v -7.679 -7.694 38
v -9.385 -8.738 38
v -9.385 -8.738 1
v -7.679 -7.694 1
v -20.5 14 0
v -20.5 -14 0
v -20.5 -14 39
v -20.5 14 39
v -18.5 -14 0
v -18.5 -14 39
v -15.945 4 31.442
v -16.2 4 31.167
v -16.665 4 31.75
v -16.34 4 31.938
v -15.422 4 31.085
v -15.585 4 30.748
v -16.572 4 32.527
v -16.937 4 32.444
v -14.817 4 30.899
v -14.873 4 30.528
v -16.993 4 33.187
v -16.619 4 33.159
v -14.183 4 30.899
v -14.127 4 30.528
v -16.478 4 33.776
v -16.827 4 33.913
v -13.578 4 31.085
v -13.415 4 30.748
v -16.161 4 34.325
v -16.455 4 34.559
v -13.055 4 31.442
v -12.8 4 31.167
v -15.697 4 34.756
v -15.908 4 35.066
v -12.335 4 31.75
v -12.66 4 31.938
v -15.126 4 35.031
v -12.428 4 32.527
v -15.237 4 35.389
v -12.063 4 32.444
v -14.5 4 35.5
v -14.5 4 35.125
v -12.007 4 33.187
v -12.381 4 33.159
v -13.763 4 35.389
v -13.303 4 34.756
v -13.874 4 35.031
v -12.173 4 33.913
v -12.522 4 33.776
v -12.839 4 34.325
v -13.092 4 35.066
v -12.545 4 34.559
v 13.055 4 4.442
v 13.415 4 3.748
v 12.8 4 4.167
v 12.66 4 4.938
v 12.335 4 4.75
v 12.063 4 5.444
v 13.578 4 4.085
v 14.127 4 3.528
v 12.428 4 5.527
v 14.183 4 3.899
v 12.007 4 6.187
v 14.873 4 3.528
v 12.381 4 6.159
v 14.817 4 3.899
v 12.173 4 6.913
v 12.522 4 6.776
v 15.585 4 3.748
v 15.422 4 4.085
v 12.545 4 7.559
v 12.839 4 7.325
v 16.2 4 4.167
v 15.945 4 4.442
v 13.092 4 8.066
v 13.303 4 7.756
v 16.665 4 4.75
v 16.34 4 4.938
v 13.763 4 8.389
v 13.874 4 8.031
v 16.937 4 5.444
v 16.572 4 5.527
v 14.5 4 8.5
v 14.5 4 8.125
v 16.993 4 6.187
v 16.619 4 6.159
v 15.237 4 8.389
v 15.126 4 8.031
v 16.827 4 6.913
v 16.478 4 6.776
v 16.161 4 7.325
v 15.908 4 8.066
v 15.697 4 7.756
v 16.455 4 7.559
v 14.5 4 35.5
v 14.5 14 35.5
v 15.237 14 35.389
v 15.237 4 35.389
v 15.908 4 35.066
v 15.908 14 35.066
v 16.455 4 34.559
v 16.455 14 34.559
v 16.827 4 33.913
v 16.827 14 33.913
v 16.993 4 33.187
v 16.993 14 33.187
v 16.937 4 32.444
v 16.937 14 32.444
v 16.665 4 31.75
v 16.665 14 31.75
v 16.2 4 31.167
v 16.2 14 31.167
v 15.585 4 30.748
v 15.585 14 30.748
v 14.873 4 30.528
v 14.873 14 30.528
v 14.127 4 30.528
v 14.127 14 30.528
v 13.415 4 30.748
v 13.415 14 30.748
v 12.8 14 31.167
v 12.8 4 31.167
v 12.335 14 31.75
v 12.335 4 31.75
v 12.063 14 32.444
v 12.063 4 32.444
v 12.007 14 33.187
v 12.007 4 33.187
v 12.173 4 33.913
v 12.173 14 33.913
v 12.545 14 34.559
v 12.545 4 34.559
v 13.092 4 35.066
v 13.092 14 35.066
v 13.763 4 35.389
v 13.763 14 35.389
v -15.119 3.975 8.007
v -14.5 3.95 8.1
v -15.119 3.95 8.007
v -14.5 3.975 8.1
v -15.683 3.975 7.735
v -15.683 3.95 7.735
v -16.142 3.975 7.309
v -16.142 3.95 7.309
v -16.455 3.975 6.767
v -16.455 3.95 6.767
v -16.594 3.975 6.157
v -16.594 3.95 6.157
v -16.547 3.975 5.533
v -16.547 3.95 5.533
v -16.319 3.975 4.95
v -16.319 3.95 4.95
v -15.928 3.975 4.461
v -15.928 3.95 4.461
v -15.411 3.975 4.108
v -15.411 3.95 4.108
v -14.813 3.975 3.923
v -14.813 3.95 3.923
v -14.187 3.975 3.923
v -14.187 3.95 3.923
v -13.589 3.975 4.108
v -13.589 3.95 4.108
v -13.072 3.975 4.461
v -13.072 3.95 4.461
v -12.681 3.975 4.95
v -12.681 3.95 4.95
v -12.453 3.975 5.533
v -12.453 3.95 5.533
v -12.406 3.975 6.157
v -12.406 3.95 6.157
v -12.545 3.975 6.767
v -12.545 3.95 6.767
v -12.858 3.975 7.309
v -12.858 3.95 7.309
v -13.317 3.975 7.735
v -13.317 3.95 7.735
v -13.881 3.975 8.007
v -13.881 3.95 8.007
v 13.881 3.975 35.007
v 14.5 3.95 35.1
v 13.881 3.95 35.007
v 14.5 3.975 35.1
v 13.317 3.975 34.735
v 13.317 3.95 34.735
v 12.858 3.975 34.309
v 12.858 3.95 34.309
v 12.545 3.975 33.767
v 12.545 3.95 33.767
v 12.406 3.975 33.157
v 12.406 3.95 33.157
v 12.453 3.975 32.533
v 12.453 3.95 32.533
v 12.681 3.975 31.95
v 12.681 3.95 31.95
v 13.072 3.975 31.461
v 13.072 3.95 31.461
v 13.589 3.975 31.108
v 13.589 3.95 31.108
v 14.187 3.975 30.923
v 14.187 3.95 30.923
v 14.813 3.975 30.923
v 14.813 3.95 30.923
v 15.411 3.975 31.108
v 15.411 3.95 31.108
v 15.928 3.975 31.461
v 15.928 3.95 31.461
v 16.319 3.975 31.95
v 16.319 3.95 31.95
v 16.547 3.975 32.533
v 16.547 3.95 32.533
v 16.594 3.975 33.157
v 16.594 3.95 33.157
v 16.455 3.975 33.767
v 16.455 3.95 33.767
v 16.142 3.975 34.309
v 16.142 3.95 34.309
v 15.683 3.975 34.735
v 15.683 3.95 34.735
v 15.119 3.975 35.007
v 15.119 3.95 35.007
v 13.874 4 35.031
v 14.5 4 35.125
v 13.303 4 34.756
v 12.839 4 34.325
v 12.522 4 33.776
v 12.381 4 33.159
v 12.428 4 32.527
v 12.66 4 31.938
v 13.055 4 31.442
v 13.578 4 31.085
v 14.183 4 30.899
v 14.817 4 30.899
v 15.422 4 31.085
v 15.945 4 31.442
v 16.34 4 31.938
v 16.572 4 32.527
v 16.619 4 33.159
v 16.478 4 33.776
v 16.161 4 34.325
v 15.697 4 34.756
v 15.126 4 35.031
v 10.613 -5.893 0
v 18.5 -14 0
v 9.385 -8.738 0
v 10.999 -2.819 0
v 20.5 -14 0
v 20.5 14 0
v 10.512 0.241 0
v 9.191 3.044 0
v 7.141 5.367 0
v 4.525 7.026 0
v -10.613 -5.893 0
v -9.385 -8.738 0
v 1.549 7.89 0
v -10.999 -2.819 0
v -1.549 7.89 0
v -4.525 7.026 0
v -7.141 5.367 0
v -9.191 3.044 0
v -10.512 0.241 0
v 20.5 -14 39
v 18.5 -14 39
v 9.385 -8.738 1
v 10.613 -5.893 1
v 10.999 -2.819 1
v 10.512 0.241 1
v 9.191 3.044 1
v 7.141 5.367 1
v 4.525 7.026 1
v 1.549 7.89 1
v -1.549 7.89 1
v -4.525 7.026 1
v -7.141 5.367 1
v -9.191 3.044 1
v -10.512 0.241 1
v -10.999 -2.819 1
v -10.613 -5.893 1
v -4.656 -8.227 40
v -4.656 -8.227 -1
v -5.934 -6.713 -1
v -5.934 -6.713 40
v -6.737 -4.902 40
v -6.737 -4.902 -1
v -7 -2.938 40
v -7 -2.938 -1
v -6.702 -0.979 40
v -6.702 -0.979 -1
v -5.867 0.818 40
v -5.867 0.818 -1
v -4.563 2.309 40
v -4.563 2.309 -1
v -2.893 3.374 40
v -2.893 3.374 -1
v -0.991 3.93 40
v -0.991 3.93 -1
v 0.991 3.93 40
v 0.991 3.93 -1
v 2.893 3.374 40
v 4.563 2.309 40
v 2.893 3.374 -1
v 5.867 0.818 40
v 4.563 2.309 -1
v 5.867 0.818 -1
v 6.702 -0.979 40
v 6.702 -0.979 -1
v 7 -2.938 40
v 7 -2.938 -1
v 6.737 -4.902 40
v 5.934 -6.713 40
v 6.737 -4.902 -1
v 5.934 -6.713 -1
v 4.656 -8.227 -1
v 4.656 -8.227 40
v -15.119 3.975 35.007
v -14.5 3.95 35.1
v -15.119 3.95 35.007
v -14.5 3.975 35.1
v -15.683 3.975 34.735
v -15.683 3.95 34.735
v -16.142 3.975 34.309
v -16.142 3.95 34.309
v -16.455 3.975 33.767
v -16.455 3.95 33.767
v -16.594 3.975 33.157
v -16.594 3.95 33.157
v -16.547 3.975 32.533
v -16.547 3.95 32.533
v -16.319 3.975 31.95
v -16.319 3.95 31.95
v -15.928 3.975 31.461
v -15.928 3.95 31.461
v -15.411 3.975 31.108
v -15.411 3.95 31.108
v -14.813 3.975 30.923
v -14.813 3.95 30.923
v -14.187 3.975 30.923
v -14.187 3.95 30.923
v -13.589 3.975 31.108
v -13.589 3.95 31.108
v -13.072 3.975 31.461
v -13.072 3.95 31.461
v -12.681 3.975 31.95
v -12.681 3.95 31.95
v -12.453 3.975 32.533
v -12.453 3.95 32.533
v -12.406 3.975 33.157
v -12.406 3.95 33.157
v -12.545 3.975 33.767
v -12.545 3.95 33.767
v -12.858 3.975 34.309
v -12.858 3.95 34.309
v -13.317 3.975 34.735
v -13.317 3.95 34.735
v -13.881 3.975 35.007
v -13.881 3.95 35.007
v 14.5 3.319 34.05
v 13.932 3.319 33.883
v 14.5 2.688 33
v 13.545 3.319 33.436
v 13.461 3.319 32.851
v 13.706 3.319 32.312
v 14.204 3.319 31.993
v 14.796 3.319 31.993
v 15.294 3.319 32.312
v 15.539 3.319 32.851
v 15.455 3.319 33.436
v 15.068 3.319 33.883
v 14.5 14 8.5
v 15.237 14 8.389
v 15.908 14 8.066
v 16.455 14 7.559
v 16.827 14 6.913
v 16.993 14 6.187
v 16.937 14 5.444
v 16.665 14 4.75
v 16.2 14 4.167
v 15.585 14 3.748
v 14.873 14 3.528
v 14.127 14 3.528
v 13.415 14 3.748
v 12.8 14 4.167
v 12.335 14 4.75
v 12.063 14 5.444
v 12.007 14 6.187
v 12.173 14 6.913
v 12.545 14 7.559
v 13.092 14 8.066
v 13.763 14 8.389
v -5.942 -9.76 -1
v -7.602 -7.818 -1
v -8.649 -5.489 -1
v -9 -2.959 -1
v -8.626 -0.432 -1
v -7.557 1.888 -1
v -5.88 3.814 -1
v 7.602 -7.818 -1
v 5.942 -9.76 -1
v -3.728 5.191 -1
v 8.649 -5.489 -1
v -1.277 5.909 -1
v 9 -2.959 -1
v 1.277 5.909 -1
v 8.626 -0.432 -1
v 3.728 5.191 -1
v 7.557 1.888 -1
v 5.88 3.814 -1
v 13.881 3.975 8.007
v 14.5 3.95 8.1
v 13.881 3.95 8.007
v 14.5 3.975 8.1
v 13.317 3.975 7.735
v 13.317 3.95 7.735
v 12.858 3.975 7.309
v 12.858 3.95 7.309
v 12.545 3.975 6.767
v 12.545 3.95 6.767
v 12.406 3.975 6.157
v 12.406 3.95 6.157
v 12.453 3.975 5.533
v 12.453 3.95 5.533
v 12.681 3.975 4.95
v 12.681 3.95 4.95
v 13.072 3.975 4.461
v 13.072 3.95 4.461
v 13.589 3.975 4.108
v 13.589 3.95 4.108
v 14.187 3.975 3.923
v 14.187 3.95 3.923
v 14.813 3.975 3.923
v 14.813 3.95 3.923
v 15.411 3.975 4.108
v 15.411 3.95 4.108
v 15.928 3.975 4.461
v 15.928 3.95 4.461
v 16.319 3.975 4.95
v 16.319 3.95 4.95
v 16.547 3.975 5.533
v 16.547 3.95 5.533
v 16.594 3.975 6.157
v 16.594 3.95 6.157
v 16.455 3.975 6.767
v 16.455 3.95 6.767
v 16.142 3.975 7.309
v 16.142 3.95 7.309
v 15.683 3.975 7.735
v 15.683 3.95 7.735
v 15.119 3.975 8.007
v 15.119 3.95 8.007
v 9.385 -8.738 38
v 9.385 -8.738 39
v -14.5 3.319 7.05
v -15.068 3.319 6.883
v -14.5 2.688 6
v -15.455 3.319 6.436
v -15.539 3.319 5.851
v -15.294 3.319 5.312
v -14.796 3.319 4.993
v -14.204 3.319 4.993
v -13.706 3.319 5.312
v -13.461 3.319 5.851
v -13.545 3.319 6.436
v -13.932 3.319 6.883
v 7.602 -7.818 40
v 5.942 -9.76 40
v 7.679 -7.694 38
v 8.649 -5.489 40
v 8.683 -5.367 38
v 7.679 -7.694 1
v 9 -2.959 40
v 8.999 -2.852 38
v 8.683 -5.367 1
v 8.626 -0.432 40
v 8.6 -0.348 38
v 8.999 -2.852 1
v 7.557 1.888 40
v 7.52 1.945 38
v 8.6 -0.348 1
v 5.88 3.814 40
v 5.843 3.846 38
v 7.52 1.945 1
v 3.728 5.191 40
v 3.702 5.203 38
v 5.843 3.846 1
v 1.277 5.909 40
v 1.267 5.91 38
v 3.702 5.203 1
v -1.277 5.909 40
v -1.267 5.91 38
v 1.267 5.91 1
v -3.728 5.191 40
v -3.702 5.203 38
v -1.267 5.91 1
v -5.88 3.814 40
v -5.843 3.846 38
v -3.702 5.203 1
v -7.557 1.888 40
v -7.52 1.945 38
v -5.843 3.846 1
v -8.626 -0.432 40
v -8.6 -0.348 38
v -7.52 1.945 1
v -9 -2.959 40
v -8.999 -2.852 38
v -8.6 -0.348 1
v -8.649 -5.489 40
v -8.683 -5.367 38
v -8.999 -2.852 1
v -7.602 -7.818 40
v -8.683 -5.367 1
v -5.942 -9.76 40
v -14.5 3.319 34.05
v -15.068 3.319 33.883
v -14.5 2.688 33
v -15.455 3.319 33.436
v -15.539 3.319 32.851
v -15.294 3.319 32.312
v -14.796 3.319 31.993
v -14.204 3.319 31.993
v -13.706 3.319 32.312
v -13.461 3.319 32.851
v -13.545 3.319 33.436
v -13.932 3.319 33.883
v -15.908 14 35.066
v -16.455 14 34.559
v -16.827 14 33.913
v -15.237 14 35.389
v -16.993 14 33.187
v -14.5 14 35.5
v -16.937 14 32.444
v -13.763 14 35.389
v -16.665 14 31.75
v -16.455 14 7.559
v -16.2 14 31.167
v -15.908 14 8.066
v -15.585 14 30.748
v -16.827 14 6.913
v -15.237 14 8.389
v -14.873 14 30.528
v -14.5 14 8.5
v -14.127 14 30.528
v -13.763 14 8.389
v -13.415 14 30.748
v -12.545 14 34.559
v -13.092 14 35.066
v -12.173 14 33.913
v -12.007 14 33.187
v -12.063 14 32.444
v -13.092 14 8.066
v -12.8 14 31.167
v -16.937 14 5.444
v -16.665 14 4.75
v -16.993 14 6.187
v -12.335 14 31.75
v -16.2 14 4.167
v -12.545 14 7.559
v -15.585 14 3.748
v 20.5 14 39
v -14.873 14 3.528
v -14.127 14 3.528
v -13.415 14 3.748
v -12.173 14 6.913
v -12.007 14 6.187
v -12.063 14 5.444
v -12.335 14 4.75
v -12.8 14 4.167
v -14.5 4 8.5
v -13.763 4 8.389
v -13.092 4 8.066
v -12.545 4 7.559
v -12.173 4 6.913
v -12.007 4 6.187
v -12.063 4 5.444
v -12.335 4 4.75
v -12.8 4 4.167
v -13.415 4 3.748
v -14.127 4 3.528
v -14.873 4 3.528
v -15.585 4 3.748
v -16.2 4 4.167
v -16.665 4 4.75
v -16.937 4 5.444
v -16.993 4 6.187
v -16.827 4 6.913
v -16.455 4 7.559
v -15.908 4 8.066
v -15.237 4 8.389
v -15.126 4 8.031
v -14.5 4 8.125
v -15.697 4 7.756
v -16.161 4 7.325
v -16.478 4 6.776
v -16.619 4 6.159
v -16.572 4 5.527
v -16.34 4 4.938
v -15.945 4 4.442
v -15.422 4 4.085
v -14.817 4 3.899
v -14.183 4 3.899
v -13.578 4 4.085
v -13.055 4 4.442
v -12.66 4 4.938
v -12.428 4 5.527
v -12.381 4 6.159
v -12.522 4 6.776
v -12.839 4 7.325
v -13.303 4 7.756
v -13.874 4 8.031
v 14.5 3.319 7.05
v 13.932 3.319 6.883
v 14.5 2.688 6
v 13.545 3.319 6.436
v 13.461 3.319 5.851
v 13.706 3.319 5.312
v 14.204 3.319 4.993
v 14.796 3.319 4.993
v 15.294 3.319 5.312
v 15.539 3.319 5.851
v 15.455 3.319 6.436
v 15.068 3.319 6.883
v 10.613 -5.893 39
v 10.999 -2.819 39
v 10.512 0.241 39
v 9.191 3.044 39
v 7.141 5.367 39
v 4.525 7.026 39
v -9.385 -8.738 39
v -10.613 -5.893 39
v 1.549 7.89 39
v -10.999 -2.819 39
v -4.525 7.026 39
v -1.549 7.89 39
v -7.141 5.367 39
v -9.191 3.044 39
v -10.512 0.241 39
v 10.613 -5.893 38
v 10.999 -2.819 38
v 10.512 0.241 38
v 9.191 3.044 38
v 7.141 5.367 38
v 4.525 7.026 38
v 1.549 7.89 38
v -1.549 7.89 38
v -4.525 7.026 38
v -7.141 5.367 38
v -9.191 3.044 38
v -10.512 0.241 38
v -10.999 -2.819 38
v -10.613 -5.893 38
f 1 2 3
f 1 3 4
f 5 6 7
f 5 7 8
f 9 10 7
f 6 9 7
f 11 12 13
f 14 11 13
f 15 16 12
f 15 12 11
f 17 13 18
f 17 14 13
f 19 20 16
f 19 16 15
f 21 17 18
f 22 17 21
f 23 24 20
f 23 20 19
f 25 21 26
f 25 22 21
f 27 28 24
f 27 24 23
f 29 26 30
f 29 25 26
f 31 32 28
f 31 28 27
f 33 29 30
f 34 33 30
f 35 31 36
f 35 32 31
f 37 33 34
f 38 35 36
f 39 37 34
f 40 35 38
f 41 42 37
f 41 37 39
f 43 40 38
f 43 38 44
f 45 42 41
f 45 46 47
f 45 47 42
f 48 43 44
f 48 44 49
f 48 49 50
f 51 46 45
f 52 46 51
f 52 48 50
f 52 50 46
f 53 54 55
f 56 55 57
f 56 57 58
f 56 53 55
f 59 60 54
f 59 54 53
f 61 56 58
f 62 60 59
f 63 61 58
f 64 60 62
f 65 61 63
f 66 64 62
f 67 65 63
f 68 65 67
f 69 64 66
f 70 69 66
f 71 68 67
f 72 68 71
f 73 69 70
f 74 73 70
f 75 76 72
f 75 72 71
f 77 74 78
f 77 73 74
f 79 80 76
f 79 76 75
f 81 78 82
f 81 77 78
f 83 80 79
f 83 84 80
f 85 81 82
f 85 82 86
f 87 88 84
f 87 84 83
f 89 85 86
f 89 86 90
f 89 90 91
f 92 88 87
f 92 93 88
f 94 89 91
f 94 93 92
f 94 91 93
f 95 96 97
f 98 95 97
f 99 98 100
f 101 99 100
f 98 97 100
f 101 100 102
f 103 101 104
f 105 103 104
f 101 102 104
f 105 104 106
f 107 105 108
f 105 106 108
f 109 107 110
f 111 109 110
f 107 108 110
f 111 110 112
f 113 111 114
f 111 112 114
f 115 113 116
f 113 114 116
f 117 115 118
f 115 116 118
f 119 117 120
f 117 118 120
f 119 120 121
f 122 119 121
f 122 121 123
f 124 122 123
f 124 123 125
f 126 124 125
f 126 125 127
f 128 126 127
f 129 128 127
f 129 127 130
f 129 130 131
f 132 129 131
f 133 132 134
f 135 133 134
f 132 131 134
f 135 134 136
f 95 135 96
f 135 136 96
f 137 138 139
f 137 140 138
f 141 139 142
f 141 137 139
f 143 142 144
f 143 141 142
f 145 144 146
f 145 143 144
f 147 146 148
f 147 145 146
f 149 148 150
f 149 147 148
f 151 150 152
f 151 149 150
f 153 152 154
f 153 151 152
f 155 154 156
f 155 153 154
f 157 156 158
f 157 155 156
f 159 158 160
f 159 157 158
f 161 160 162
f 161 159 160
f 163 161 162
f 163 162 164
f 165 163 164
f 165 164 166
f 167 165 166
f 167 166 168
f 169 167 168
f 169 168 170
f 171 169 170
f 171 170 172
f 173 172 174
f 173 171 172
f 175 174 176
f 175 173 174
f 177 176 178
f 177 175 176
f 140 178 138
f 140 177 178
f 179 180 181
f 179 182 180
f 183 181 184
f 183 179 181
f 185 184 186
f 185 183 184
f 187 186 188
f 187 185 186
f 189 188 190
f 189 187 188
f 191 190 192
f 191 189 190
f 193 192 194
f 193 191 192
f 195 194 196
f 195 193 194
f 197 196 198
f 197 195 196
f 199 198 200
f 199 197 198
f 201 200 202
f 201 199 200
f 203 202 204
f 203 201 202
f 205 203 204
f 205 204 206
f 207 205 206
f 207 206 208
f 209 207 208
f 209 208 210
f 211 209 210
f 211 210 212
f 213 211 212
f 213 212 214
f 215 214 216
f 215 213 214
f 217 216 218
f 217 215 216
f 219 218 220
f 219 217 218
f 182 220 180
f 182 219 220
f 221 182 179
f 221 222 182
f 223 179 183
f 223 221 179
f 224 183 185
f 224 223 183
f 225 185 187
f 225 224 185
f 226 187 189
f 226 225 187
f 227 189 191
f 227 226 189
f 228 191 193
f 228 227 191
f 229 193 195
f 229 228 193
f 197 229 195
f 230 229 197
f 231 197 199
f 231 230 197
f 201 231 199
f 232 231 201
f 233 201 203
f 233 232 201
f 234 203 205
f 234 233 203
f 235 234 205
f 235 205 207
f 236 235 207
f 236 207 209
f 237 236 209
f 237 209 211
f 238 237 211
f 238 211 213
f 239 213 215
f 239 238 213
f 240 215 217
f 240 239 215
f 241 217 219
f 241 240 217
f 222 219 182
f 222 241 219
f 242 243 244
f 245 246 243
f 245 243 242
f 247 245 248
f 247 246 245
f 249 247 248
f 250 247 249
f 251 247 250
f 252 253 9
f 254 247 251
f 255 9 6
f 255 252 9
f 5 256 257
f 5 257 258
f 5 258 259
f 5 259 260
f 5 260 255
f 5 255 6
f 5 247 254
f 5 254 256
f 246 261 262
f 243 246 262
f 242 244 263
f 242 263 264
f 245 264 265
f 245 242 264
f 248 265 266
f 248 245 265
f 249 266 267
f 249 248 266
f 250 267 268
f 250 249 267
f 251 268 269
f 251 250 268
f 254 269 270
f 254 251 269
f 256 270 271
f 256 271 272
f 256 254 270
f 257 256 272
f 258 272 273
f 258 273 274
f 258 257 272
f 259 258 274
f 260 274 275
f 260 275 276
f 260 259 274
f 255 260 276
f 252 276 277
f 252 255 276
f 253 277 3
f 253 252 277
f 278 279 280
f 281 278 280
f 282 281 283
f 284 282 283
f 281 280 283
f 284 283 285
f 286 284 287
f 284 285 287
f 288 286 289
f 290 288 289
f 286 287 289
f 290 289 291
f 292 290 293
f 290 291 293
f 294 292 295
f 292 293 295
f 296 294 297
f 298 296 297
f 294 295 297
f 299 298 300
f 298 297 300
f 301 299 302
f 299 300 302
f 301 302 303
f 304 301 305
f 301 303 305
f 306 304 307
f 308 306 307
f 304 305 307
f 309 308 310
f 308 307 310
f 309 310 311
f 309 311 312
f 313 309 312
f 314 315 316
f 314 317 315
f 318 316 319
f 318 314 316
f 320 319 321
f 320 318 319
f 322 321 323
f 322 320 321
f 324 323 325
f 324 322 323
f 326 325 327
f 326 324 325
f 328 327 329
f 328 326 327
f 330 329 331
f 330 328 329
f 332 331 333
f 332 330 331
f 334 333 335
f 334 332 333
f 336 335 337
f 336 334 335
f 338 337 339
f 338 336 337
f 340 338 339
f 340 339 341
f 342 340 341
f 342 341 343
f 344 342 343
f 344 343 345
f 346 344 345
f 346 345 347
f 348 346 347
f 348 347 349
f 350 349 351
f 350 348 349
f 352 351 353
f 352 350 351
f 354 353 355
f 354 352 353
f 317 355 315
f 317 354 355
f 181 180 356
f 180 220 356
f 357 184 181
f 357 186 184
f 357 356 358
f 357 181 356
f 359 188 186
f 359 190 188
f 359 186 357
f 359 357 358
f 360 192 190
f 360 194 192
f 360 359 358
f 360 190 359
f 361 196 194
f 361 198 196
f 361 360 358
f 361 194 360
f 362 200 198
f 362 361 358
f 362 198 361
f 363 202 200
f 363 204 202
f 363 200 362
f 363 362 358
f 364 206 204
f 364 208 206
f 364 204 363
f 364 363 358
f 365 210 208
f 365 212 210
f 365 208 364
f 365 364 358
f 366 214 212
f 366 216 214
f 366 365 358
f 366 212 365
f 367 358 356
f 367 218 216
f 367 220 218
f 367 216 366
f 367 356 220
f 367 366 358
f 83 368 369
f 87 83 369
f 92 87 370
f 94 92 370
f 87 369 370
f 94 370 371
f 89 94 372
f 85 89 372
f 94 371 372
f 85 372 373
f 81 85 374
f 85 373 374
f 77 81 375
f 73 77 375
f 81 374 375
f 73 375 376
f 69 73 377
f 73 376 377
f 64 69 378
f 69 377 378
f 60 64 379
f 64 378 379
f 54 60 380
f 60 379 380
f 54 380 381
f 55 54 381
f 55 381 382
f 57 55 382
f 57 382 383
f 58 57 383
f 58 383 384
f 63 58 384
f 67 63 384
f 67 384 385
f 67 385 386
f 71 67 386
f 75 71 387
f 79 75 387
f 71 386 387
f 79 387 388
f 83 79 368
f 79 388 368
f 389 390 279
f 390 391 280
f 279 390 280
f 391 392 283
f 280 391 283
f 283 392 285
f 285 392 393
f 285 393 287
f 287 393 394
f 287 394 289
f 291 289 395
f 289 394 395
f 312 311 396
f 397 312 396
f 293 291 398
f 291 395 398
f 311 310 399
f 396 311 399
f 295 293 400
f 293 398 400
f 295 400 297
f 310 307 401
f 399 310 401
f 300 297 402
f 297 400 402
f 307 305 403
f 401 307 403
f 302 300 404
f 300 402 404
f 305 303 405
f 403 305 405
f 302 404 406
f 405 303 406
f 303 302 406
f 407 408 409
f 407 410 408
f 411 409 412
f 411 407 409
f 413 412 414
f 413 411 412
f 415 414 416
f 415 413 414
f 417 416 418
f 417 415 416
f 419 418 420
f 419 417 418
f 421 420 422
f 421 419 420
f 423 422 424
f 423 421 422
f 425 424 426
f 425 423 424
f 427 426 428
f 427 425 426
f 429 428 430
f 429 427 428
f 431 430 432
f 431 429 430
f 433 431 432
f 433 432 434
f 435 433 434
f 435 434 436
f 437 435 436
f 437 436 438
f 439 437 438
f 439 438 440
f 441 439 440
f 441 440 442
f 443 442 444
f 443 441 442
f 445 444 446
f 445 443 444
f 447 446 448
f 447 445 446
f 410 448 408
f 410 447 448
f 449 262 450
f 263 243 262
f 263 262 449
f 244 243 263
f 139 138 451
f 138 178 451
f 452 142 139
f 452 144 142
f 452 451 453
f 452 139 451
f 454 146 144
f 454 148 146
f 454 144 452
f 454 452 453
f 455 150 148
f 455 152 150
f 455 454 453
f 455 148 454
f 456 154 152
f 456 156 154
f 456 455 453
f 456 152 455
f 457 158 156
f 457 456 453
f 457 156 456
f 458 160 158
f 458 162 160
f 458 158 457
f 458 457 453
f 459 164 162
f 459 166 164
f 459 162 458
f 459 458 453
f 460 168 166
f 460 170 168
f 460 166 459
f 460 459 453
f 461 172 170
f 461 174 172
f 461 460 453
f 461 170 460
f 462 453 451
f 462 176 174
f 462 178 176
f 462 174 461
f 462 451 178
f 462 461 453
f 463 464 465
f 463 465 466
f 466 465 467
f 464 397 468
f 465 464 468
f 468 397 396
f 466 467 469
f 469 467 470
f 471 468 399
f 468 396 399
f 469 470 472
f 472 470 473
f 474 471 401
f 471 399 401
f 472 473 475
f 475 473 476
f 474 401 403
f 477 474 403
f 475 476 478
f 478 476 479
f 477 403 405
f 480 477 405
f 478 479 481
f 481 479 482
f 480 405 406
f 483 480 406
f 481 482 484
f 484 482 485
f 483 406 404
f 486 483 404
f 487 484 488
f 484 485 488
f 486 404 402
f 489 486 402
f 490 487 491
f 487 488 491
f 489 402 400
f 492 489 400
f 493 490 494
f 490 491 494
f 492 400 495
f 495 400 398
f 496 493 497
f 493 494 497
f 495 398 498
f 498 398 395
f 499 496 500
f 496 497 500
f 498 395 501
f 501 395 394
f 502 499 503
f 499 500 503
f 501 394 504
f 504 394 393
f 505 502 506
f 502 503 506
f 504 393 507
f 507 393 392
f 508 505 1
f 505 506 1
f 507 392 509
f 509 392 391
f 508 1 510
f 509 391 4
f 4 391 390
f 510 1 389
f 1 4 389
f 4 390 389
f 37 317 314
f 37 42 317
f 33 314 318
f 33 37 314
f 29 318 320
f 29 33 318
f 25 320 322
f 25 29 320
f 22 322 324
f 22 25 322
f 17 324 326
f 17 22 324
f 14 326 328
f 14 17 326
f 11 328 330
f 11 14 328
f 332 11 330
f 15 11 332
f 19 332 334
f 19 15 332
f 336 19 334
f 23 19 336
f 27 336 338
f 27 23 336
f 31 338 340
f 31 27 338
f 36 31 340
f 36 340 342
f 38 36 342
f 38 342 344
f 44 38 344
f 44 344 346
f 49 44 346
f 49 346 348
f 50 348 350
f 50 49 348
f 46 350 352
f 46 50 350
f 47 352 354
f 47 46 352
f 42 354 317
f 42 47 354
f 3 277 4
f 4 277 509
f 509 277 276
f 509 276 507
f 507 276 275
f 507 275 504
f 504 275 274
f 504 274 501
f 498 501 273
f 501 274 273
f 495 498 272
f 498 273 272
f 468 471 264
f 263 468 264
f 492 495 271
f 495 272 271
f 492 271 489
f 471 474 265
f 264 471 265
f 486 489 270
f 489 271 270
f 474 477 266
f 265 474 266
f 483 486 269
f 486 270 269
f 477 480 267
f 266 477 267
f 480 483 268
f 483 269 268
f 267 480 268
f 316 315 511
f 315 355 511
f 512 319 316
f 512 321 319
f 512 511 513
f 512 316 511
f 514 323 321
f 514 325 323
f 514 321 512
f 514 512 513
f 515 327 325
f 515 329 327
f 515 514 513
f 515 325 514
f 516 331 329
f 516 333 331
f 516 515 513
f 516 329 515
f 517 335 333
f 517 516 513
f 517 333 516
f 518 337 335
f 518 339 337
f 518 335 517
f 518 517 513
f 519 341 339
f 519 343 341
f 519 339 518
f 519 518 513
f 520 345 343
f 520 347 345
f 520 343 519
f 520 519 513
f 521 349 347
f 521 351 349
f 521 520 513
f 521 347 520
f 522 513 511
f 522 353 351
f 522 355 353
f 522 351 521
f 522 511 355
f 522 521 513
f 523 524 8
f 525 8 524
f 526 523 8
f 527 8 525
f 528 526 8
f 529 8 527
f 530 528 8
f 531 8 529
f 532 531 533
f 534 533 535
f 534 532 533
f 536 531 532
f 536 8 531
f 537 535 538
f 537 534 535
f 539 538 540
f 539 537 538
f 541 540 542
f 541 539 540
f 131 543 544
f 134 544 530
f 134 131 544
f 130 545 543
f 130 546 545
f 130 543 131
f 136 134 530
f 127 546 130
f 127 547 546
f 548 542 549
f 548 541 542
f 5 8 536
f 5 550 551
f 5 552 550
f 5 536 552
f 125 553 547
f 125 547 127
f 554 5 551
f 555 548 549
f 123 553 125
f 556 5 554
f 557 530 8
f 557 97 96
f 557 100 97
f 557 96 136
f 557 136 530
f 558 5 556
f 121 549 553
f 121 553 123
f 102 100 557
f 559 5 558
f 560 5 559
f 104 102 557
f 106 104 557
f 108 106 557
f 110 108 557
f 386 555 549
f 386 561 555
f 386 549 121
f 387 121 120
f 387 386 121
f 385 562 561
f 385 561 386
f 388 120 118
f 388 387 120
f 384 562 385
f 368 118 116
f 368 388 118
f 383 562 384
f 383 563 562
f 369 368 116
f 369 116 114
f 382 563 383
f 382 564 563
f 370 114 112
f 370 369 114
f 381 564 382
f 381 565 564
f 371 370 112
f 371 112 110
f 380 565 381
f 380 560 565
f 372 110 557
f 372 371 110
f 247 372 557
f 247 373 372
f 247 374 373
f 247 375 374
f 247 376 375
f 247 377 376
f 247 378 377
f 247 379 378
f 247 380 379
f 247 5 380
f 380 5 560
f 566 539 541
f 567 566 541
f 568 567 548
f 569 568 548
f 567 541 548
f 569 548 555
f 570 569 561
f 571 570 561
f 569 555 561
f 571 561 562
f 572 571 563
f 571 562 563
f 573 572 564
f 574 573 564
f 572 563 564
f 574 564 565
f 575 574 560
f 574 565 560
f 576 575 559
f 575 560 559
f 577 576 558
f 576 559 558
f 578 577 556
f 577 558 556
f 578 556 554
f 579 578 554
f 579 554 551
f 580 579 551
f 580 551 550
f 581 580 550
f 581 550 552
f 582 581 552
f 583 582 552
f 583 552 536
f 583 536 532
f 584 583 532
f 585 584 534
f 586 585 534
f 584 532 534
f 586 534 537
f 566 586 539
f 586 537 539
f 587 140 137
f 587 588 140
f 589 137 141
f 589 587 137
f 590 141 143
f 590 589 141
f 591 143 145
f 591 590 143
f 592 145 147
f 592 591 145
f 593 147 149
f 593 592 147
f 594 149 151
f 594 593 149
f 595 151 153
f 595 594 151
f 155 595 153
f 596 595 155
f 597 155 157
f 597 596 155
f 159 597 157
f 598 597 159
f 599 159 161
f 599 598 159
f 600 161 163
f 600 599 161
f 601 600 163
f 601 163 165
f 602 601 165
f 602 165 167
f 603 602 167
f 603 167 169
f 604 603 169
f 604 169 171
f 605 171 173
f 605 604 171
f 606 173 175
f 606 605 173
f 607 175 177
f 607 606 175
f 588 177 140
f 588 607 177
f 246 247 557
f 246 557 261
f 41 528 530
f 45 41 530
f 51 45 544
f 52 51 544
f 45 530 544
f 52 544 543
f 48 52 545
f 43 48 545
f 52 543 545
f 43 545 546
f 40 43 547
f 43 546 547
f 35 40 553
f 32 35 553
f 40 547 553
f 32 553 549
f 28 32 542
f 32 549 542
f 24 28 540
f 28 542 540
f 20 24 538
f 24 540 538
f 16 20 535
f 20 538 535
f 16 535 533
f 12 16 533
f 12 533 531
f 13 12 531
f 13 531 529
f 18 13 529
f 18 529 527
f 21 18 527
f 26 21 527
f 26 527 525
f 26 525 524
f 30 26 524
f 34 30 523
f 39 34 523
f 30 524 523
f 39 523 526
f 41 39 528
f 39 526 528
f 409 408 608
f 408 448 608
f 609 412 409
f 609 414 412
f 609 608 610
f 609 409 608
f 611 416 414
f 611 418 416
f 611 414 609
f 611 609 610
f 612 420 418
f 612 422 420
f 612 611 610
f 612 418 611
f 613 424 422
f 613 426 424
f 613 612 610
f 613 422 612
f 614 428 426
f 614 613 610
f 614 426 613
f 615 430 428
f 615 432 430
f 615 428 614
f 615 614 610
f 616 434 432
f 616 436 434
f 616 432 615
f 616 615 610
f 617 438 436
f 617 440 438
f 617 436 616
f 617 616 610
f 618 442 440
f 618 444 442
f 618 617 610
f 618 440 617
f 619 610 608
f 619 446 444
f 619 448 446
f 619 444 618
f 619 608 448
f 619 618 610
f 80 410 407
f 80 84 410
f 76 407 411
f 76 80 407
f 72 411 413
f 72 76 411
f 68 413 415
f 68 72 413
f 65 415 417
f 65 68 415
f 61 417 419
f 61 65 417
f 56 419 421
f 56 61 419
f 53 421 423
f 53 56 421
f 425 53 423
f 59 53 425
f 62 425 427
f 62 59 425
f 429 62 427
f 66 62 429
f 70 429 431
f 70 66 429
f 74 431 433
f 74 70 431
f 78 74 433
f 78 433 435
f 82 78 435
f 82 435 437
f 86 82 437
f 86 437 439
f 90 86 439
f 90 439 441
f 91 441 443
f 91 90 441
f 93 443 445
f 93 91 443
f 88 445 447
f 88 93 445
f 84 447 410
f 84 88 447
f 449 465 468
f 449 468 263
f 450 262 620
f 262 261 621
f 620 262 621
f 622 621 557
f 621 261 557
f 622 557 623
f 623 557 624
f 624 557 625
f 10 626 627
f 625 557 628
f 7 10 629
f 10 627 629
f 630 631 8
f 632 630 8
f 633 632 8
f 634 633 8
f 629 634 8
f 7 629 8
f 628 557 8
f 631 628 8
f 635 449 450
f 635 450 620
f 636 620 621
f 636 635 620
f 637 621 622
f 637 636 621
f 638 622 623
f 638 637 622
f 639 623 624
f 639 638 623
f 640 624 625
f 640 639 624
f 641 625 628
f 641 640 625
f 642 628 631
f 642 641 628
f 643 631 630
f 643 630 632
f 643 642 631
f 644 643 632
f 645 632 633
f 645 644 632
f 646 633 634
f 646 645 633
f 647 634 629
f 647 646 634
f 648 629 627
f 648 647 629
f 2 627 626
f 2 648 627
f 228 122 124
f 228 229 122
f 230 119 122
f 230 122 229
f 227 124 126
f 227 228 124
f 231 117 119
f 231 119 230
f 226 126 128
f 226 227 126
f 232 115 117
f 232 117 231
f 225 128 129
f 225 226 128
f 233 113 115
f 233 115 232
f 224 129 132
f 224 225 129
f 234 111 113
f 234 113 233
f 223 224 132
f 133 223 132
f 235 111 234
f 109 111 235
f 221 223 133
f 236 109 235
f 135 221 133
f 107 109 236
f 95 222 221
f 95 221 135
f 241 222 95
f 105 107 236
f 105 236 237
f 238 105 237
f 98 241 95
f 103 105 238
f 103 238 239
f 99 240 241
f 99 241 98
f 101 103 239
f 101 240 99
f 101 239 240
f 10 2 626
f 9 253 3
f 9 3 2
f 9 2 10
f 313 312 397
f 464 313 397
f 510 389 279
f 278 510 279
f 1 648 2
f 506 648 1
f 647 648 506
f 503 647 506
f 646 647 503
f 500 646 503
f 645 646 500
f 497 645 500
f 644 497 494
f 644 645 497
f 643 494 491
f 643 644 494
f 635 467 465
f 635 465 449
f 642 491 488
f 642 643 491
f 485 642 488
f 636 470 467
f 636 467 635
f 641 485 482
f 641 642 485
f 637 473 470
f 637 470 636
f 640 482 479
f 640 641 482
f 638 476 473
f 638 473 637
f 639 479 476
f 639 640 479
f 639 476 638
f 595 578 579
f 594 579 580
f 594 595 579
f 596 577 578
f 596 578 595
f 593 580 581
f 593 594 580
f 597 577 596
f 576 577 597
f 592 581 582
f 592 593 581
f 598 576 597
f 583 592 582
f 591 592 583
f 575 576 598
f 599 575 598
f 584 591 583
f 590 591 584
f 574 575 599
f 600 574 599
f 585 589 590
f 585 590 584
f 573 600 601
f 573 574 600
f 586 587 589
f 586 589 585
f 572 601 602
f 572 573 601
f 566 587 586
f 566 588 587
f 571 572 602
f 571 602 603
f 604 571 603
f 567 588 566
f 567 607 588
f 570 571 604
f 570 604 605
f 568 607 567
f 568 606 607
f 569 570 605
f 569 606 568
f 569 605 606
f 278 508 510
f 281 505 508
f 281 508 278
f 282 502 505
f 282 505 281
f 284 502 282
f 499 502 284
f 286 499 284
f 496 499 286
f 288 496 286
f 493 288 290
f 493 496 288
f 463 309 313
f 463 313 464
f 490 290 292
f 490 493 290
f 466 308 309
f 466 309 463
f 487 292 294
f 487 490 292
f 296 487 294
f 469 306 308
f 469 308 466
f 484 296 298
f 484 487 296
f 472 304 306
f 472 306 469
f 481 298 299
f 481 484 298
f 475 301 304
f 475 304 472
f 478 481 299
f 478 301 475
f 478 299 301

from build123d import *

# Parameters (mm, degrees)
BOSS_EXTRUDE1_DEPTH                  = 39
BOSS_EXTRUDE3_START                  = 1
BOSS_EXTRUDE3_DEPTH                  = 37
BOSS_EXTRUDE4_START                  = -1
BOSS_EXTRUDE4_DEPTH                  = 41
SKETCH4_R                            = 2.5
CUT_EXTRUDE1_DEPTH                   = 10
TAP_DRILL_FOR_M5X0_8_TAP1_AT_2_COUNT = 2
TAP_DRILL_FOR_M5X0_8_TAP1_AT_2_PITCH = 27
TAP_DRILL_FOR_M5X0_8_TAP1_AT_3_COUNT = 2
TAP_DRILL_FOR_M5X0_8_TAP1_AT_3_PITCH = 39.623223611
TAP_DRILL_FOR_M5X0_8_TAP1_AT_4_COUNT = 2
TAP_DRILL_FOR_M5X0_8_TAP1_AT_4_PITCH = 28.999998701


with BuildPart() as part:
    # Sketch1 → Boss-Extrude1 (new body)
    with BuildSketch(Plane.XY):
        with BuildLine():
            Line((-20.5, 14), (20.5, 14))
            Line((20.5, 14), (20.5, -14))
            Line((20.5, -14), (18.5, -14))
            Line((18.5, -14), (9.385134519, -8.737529961))
            ThreePointArc((9.385134519, -8.737529961), (0, 8), (-9.385134519, -8.737529961))
            Line((-9.385134519, -8.737529961), (-18.5, -14))
            Line((-18.5, -14), (-20.5, -14))
            Line((-20.5, -14), (-20.5, 14))
        make_face()
    extrude(amount=BOSS_EXTRUDE1_DEPTH)



with BuildPart() as body_2:
    # Sketch2 → Boss-Extrude3 (new body)
    with BuildSketch(Plane.XY.offset(BOSS_EXTRUDE3_START)):
        with BuildLine():
            Line((-9.385134519, -8.737529961), (-7.678746425, -7.694342695))
            ThreePointArc((-7.678746425, -7.694342695), (0, 6), (7.678746425, -7.694342695))
            Line((7.678746425, -7.694342695), (9.385134519, -8.737529961))
            ThreePointArc((9.385134519, -8.737529961), (0, 8), (-9.385134519, -8.737529961))
        make_face()
    extrude(amount=BOSS_EXTRUDE3_DEPTH)


with BuildPart() as part_1:
    add(part.part)

    add(body_2.part)  # Boss-Extrude4 merges body 2
    # Sketch3 → Boss-Extrude4 (add)
    with BuildSketch(Plane.XY.offset(BOSS_EXTRUDE4_START)):
        with BuildLine():
            Line((-5.9419479, -9.759678628), (-4.655936286, -8.227069666))
            ThreePointArc((-4.655936286, -8.227069666), (0, 4), (4.655936286, -8.227069666))
            Line((4.655936286, -8.227069666), (5.9419479, -9.759678628))
            ThreePointArc((5.9419479, -9.759678628), (0, 6), (-5.9419479, -9.759678628))
        make_face()
    extrude(amount=BOSS_EXTRUDE4_DEPTH)

    # Sketch4 → Cut-Extrude1 (cut)
    with BuildSketch(Plane(origin=(0, 14, 0), x_dir=(1, 0, 0), z_dir=(0, 1, 0))):
        with Locations(Location((-14.5, -6, 0), (0, 0, 270))):
            Circle(SKETCH4_R)
        with Locations(Location((14.499998701, -6, 0), (0, 0, 270))):
            Circle(SKETCH4_R)
        with Locations(Location((14.5, -33, 0), (0, 0, 270))):
            Circle(SKETCH4_R)
        with Locations(Location((-14.499998701, -33, 0), (0, 0, 270))):
            Circle(SKETCH4_R)
    extrude(amount=-CUT_EXTRUDE1_DEPTH, mode=Mode.SUBTRACT)

    # Sketch8 → Tap Drill for M5x0.8 Tap1 (revolve, cut)
    with BuildSketch(Plane(origin=(-14.499998701, 4, 33), x_dir=(0, 0, 1), z_dir=(1, 0, 0))):
        Polygon((0, 0), (0, 1.3118073), (2.1, 0.05), (2.1, 0.025), (2.125, 0), align=None)
    tap_drill_for_m5x0_8_tap1 = revolve(axis=Axis((-14.499998701, 10.35, 33), (0, -1, 0)), mode=Mode.SUBTRACT)

    # Tap Drill for M5x0.8 Tap1 at 2: Tap Drill for M5x0.8 Tap1 ×2
    with Locations(*[(0, 0, -i * TAP_DRILL_FOR_M5X0_8_TAP1_AT_2_PITCH) for i in range(1, TAP_DRILL_FOR_M5X0_8_TAP1_AT_2_COUNT)]):
        add(tap_drill_for_m5x0_8_tap1, mode=Mode.SUBTRACT)

    # Tap Drill for M5x0.8 Tap1 at 3: Tap Drill for M5x0.8 Tap1 ×2
    with Locations(*[Vector(0.7318939439938763, 0, -0.6814185606109426) * (i * TAP_DRILL_FOR_M5X0_8_TAP1_AT_3_PITCH) for i in range(1, TAP_DRILL_FOR_M5X0_8_TAP1_AT_3_COUNT)]):
        add(tap_drill_for_m5x0_8_tap1, mode=Mode.SUBTRACT)

    # Tap Drill for M5x0.8 Tap1 at 4: Tap Drill for M5x0.8 Tap1 ×2
    with Locations(*[(i * TAP_DRILL_FOR_M5X0_8_TAP1_AT_4_PITCH, 0, 0) for i in range(1, TAP_DRILL_FOR_M5X0_8_TAP1_AT_4_COUNT)]):
        add(tap_drill_for_m5x0_8_tap1, mode=Mode.SUBTRACT)


solid = part_1.part
